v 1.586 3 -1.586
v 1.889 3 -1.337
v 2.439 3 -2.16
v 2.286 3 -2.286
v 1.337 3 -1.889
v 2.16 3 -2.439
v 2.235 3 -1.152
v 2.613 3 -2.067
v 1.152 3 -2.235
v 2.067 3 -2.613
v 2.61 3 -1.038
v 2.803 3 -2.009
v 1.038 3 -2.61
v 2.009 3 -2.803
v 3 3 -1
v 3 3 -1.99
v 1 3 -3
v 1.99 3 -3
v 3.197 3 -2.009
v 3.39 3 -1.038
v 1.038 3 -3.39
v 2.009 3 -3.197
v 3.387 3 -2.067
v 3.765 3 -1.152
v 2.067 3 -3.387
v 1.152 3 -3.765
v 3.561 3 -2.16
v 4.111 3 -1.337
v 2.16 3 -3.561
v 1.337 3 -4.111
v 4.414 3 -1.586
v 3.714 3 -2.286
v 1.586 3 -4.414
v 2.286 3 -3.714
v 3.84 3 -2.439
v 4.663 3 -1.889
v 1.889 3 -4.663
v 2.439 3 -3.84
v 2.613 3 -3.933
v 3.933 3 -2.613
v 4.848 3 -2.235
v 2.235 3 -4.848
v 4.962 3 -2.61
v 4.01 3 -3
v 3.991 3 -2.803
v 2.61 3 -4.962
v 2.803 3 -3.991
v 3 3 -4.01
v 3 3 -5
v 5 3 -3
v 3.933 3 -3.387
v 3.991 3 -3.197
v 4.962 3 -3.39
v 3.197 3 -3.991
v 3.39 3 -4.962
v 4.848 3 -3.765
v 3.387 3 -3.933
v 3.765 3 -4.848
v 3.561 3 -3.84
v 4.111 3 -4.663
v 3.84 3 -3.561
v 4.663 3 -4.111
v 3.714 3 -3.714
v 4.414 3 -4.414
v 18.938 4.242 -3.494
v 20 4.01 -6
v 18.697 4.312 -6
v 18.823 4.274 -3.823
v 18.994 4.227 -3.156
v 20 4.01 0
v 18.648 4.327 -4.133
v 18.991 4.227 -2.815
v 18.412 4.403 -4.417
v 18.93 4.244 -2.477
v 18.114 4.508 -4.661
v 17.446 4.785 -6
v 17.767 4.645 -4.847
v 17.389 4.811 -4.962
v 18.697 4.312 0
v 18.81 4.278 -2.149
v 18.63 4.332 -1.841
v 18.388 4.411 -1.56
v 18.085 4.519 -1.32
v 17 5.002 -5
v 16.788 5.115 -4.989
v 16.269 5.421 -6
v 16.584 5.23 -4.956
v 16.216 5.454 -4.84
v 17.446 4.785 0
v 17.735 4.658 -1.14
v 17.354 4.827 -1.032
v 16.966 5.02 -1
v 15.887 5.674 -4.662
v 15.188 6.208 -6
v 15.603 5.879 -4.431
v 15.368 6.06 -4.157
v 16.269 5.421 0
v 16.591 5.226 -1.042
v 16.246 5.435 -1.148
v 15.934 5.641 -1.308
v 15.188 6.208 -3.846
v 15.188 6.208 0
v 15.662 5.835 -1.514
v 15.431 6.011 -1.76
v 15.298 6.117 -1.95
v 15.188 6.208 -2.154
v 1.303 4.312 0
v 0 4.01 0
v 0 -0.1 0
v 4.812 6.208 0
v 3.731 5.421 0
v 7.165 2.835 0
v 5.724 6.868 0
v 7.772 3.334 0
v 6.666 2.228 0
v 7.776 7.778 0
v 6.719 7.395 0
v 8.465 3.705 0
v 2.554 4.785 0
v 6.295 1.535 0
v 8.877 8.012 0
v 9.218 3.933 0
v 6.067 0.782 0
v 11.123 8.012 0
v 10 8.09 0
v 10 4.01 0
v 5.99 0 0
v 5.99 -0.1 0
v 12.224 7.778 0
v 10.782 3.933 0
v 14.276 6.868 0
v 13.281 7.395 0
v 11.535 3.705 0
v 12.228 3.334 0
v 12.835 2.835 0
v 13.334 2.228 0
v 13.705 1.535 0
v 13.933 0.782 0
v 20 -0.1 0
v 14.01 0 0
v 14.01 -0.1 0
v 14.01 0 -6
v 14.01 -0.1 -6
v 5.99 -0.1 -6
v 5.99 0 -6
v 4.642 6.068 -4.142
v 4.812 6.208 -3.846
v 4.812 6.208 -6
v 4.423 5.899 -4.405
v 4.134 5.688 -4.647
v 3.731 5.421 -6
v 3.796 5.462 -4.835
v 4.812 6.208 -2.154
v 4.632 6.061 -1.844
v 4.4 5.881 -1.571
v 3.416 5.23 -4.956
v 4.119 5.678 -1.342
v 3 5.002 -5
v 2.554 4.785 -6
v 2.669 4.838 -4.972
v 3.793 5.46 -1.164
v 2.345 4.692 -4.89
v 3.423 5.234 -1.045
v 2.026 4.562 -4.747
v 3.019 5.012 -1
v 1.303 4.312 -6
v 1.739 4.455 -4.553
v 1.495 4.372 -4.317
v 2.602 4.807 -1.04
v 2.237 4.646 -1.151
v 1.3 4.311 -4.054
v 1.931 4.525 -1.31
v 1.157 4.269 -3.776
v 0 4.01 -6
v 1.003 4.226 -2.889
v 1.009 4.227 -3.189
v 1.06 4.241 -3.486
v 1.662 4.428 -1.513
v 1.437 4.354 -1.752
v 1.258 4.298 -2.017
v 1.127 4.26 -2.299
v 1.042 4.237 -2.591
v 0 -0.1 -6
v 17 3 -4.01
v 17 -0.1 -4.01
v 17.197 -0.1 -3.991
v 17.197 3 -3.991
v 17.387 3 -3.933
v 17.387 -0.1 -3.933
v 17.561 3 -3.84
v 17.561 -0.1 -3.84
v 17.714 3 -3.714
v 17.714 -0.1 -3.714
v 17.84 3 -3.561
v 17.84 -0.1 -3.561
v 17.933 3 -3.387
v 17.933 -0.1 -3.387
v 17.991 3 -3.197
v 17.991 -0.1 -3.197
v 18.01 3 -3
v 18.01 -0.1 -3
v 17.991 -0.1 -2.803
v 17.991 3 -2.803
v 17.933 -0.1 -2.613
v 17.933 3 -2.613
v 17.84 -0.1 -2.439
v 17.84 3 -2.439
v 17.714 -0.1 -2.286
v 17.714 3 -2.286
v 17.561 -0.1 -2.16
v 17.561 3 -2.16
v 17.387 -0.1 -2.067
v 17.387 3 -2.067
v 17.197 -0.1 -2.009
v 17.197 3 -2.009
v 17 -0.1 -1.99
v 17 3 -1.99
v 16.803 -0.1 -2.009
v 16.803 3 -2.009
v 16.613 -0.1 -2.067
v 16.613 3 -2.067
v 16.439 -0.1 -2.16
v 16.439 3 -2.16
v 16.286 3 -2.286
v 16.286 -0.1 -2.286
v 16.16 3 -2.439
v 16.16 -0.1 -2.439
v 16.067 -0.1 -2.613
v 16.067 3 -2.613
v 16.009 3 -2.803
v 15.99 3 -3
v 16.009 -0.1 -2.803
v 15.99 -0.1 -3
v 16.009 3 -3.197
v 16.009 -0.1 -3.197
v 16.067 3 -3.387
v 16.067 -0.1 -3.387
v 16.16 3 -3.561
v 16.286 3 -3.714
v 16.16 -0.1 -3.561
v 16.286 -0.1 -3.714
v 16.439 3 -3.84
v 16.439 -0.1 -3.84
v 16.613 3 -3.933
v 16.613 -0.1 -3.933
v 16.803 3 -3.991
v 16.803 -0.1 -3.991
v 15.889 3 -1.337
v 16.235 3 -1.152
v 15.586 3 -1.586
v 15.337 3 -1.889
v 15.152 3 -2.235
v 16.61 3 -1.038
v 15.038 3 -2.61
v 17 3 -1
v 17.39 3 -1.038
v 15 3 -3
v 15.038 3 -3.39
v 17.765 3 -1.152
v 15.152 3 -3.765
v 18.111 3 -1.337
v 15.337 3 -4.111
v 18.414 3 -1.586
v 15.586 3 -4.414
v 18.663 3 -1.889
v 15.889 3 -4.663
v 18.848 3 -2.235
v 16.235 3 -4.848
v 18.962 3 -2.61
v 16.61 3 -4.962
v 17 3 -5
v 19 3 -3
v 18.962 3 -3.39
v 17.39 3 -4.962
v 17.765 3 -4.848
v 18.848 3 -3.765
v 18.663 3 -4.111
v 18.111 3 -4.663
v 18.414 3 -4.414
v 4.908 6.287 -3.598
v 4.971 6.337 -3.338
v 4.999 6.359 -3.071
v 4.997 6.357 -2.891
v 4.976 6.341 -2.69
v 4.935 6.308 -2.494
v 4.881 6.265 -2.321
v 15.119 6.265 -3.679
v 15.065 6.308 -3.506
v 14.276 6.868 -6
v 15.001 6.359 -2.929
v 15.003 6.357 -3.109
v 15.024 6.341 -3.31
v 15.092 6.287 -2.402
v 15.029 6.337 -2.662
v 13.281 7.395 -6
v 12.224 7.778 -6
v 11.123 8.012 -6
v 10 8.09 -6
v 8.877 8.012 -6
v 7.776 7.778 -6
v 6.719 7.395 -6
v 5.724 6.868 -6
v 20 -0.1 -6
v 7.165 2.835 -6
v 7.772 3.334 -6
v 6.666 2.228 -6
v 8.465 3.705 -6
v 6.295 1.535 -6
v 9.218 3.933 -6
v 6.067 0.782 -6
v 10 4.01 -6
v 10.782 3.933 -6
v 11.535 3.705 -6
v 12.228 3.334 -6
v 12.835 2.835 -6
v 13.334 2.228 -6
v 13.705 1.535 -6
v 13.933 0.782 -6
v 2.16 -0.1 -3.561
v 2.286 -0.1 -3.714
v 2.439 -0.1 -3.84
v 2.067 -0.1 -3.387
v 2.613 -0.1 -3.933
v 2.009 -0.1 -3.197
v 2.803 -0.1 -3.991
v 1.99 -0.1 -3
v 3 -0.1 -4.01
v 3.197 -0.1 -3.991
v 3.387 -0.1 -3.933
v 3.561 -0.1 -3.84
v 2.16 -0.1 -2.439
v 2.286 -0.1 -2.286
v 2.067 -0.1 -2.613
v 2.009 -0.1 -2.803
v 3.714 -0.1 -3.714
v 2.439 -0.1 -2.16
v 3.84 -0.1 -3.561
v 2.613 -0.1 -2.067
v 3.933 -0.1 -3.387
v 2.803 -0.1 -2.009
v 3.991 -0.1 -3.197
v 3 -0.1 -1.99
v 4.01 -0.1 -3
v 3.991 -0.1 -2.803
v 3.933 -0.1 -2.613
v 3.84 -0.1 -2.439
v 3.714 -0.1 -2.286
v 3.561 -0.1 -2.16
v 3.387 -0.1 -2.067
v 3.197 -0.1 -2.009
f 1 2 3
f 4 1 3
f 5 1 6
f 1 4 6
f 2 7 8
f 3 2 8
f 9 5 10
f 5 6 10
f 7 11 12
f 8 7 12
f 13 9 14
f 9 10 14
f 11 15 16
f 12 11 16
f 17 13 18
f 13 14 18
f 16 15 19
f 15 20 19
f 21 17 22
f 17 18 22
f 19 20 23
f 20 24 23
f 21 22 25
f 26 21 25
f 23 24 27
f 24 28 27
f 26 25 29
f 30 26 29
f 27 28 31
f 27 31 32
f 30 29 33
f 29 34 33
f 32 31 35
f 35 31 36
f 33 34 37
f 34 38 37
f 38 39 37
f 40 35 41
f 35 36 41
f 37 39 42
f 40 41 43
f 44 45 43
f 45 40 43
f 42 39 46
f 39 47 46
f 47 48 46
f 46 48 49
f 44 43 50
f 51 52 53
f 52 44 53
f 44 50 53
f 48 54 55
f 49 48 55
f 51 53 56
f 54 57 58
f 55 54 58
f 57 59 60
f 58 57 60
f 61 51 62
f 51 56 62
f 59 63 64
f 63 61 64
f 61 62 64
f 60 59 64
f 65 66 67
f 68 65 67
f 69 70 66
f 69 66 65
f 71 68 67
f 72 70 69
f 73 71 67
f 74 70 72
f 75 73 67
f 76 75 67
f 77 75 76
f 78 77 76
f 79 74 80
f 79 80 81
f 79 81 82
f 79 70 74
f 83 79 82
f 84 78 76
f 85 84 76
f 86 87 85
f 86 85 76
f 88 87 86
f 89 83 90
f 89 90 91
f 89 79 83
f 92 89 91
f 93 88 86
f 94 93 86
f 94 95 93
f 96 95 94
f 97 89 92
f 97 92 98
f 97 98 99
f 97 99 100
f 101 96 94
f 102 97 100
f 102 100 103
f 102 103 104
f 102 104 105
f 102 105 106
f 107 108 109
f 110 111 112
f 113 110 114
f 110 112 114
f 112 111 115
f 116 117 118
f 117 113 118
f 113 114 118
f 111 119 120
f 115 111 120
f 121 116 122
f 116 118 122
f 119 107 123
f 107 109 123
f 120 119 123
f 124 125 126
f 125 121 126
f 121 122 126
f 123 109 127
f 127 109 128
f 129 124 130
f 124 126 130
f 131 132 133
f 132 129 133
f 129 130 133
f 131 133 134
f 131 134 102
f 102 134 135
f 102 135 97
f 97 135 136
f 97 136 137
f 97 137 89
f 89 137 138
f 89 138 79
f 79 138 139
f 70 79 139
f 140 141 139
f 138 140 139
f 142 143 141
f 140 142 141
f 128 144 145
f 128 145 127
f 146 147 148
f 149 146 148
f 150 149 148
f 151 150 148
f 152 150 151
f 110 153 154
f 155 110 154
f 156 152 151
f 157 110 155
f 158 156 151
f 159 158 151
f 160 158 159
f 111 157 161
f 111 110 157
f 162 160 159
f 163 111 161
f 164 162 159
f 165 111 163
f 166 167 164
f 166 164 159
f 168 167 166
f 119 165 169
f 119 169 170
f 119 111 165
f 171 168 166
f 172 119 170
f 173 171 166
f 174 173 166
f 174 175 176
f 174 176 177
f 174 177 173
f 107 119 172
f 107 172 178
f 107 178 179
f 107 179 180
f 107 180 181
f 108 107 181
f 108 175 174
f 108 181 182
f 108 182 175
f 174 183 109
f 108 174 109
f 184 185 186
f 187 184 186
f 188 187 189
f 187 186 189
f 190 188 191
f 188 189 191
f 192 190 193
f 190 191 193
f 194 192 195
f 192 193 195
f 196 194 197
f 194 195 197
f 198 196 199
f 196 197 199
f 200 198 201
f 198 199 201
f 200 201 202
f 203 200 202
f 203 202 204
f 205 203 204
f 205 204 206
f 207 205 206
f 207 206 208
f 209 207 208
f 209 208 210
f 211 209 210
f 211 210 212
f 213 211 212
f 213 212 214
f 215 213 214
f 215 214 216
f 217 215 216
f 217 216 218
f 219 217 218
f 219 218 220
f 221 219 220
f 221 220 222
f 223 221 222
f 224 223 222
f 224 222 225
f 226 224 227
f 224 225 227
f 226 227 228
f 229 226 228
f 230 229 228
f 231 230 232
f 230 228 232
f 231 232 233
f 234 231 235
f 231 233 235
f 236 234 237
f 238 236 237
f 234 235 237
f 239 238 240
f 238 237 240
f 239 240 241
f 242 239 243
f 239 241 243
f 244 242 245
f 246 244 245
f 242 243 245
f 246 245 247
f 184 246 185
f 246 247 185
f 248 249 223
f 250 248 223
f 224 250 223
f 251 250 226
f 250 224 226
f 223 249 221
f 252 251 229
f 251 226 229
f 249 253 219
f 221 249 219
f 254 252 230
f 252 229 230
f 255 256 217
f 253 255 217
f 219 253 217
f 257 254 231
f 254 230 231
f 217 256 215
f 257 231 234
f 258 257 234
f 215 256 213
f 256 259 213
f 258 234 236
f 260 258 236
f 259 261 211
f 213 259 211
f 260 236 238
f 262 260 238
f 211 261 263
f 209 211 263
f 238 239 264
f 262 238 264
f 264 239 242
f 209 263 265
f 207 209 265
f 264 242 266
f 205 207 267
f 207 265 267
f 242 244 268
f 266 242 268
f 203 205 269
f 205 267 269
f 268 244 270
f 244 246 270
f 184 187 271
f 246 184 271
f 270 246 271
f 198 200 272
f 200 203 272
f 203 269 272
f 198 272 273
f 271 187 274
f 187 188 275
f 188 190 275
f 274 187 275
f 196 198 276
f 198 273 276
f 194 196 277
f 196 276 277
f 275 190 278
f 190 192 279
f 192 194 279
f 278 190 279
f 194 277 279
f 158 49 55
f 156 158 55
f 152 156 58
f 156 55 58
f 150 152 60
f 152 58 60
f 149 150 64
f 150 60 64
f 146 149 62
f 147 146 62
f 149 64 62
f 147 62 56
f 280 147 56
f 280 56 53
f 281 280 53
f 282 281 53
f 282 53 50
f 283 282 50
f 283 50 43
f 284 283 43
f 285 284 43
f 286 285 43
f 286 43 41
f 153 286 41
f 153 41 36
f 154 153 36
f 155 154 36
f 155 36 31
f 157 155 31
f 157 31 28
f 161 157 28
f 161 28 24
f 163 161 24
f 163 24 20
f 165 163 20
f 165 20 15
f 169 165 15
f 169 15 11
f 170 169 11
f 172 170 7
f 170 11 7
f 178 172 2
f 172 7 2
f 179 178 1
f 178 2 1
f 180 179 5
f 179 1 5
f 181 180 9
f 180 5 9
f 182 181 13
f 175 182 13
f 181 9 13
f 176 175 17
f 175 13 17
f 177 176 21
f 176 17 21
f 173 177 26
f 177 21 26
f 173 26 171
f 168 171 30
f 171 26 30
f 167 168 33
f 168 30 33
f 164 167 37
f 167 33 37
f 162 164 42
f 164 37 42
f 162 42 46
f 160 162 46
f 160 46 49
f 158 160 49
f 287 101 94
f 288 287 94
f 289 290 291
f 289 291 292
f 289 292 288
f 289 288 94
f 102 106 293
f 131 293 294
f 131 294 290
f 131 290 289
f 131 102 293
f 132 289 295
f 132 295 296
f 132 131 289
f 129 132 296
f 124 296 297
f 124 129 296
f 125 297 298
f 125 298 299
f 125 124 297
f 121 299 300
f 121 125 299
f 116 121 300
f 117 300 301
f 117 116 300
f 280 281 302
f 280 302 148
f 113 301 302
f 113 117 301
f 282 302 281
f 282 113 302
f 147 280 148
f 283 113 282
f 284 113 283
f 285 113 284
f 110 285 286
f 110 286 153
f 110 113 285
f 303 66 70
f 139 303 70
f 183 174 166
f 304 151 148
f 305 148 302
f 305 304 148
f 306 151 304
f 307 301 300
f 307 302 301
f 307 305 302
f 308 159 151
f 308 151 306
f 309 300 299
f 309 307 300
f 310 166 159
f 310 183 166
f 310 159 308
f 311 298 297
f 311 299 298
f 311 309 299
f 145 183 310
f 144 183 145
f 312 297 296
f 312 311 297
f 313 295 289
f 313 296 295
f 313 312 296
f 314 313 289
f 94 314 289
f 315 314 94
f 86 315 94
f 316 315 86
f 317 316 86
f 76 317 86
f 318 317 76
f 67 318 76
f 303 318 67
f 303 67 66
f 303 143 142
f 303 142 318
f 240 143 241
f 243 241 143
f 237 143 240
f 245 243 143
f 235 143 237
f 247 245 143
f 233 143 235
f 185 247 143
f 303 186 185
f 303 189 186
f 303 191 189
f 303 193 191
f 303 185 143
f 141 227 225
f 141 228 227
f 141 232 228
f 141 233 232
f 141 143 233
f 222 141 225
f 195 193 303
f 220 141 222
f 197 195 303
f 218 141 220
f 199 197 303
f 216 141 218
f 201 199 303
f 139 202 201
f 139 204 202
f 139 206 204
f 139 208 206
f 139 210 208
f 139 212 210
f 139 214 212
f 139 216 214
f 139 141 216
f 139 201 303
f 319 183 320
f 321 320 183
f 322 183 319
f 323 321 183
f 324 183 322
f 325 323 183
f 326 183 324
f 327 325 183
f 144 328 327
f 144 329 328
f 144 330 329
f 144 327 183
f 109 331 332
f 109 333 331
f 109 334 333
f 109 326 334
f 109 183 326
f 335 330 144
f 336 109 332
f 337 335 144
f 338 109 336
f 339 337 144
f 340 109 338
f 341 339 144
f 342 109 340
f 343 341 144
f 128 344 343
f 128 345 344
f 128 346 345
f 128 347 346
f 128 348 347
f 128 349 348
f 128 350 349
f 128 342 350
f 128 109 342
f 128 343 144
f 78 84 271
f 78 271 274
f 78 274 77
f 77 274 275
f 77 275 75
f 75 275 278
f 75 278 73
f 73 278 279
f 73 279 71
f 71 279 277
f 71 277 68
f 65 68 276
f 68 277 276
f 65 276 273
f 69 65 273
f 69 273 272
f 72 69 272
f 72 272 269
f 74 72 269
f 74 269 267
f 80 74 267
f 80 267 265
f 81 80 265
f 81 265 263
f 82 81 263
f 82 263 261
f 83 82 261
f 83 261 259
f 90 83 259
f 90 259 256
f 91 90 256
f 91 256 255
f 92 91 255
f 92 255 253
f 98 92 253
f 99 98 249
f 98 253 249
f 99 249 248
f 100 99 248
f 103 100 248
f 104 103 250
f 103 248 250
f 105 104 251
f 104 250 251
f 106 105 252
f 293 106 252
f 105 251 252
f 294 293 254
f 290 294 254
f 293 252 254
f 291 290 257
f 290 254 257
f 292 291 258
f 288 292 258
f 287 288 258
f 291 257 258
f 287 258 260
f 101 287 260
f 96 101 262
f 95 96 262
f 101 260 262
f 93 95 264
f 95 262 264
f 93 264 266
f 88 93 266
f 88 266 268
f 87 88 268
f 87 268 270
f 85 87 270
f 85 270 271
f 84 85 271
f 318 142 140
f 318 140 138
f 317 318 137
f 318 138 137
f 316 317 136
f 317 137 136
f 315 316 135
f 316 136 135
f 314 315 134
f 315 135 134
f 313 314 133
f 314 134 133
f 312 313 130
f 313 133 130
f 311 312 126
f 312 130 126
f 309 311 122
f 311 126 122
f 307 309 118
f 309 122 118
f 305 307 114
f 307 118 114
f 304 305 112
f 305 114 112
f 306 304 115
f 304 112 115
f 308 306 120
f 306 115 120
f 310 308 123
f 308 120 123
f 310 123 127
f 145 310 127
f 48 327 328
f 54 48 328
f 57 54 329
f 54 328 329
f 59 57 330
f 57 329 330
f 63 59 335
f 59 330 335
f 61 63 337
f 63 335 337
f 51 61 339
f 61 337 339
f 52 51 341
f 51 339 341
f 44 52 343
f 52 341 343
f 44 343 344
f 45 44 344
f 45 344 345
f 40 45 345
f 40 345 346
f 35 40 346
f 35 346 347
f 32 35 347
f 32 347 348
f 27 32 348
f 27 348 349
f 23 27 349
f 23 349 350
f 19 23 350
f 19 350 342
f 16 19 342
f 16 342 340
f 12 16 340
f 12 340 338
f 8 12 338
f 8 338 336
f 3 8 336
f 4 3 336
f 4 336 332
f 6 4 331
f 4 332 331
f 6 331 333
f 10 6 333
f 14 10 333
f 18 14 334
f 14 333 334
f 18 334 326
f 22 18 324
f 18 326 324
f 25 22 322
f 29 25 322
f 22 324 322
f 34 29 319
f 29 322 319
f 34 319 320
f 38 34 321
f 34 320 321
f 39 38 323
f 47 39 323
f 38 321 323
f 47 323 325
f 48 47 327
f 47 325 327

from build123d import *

# Parameters (mm, degrees)
SKETCH1_W           = 20
SKETCH1_H           = 6
BOSS_EXTRUDE1_DEPTH = 4.01
BOSS_EXTRUDE2_DEPTH = 6
SKETCH5_W           = 20
SKETCH5_H           = 6
BOSS_EXTRUDE3_DEPTH = 3
SKETCH6_R           = 4.01
CUT_EXTRUDE2_DEPTH  = 8
SKETCH7_W           = 20
SKETCH7_H           = 6
CUT_EXTRUDE3_DEPTH  = 3
FILLET1_R           = 10
SKETCH8_R           = 1.01
CUT_EXTRUDE4_DEPTH  = 23.393010339
CUT_EXTRUDE5_START  = -3
SKETCH9_R           = 2
CUT_EXTRUDE5_DEPTH  = 10
BOSS_EXTRUDE4_START = 0.1
SKETCH10_W          = 5.99
SKETCH10_H          = 6
SKETCH10_R          = 1.01
BOSS_EXTRUDE4_DEPTH = 0.1


with BuildPart() as part:
    # Sketch1 → Boss-Extrude1 (new body)
    with BuildSketch(Plane(origin=(0, 0, 0), x_dir=(1, 0, 0), z_dir=(0, 1, 0))):
        with Locations((10, 3)):
            Rectangle(SKETCH1_W, SKETCH1_H)
    extrude(amount=BOSS_EXTRUDE1_DEPTH)

    # Sketch2 → Boss-Extrude2 (add)
    with BuildSketch(Plane.XY):
        with BuildLine():
            Line((2.973847991, 4.01), (17.026152009, 4.01))
            ThreePointArc((17.026152009, 4.01), (10, 8.089926579), (2.973847991, 4.01))
        make_face()
    extrude(amount=-BOSS_EXTRUDE2_DEPTH)

    # Sketch5 → Boss-Extrude3 (add)
    with BuildSketch(Plane.XZ):
        with Locations((10, -3)):
            Rectangle(SKETCH5_W, SKETCH5_H)
    extrude(amount=BOSS_EXTRUDE3_DEPTH)

    # Sketch6 → Cut-Extrude2 (cut)
    with BuildSketch(Plane.XY):
        with Locations((10, 0)):
            Circle(SKETCH6_R)
    extrude(amount=-CUT_EXTRUDE2_DEPTH, mode=Mode.SUBTRACT)

    # Sketch7 → Cut-Extrude3 (cut)
    with BuildSketch(Plane.XZ.offset(3)):
        with Locations((10, -3)):
            Rectangle(SKETCH7_W, SKETCH7_H)
    extrude(amount=-CUT_EXTRUDE3_DEPTH, mode=Mode.SUBTRACT)

    # Fillet1
    # the kernel refuses this fillet: 10 mm, written as the material it adds along each edge
    with BuildSketch(Plane(origin=(17.026152009, 4.01, 0), x_dir=(1, 0, 0), z_dir=(0, 0, -1))) as fillet1_piece_1:
        with BuildLine():
            CenterArc((4.573770937, -9.871182633), FILLET1_R, 99.206448973, 30.677642317)
            Line((-1.838595026, -2.197750365), (-1.966842345, -2.04428172))
            ThreePointArc((-1.966842345, -2.04428172), (-0.974617613, -1.052595468), (-0.173701255, 0.099135634))
            Line((-0.173701255, 0.099135634), (0, 0.2))
            ThreePointArc((0, 0.2), (1.486923995, 0.2), (2.941849532, 0.197423653))
            Line((2.941849532, 0.197423653), (2.973847991, 0))
        make_face()
    extrude(amount=6)
    with BuildSketch(Plane(origin=(2.973847991, 4.01, 0), x_dir=(0.6416530517809019, 0.7669950202838707, 0), z_dir=(0, 0, -1))) as fillet1_piece_2:
        with BuildLine():
            CenterArc((4.636373844, -9.841933994), FILLET1_R, 100.200714573, 30.677642317)
            Line((-1.908178639, -2.2809266), (-2.039069689, -2.129706452))
            ThreePointArc((-2.039069689, -2.129706452), (-1.107488324, -1.01213269), (-0.153399004, 0.12833061))
            Line((-0.153399004, 0.12833061), (0.035419403, 0.19683868))
            ThreePointArc((0.035419403, 0.19683868), (1.432701848, 0.072125761), (2.829984292, 0.19683868))
            Line((2.829984292, 0.19683868), (2.865403695, 0))
        make_face()
    extrude(amount=6)

    # Sketch8 → Cut-Extrude4 (cut, through all)
    with BuildSketch(Plane.XZ):
        with Locations(Location((3, -3, 0), (0, 0, 270))):
            Circle(SKETCH8_R)
        with Locations(Location((17, -3, 0), (0, 0, 270))):
            Circle(SKETCH8_R)
    extrude(amount=-CUT_EXTRUDE4_DEPTH, mode=Mode.SUBTRACT)

    # Sketch9 → Cut-Extrude5 (cut)
    with BuildSketch(Plane.XZ.offset(CUT_EXTRUDE5_START)):
        with Locations(Location((3, -3, 0), (0, 0, 270))):
            Circle(SKETCH9_R)
        with Locations(Location((17, -3, 0), (0, 0, 270))):
            Circle(SKETCH9_R)
    extrude(amount=-CUT_EXTRUDE5_DEPTH, mode=Mode.SUBTRACT)

    # Sketch10 → Boss-Extrude4 (add)
    # profile 1 of 2: a face of its own
    with BuildSketch(Plane.XZ.offset(BOSS_EXTRUDE4_START)):
        with Locations((2.995, -3)):
            Rectangle(SKETCH10_W, SKETCH10_H)
        with Locations(Location((3, -3, 0), (0, 0, 270))):
            Circle(SKETCH10_R, mode=Mode.SUBTRACT)
    # profile 2 of 2: a face of its own
    with BuildSketch(Plane.XZ.offset(BOSS_EXTRUDE4_START)):
        with Locations((17.005, -3)):
            Rectangle(SKETCH10_W, SKETCH10_H)
        with Locations(Location((17, -3, 0), (0, 0, 270))):
            Circle(SKETCH10_R, mode=Mode.SUBTRACT)
    extrude(amount=-BOSS_EXTRUDE4_DEPTH)


solid = part.part
